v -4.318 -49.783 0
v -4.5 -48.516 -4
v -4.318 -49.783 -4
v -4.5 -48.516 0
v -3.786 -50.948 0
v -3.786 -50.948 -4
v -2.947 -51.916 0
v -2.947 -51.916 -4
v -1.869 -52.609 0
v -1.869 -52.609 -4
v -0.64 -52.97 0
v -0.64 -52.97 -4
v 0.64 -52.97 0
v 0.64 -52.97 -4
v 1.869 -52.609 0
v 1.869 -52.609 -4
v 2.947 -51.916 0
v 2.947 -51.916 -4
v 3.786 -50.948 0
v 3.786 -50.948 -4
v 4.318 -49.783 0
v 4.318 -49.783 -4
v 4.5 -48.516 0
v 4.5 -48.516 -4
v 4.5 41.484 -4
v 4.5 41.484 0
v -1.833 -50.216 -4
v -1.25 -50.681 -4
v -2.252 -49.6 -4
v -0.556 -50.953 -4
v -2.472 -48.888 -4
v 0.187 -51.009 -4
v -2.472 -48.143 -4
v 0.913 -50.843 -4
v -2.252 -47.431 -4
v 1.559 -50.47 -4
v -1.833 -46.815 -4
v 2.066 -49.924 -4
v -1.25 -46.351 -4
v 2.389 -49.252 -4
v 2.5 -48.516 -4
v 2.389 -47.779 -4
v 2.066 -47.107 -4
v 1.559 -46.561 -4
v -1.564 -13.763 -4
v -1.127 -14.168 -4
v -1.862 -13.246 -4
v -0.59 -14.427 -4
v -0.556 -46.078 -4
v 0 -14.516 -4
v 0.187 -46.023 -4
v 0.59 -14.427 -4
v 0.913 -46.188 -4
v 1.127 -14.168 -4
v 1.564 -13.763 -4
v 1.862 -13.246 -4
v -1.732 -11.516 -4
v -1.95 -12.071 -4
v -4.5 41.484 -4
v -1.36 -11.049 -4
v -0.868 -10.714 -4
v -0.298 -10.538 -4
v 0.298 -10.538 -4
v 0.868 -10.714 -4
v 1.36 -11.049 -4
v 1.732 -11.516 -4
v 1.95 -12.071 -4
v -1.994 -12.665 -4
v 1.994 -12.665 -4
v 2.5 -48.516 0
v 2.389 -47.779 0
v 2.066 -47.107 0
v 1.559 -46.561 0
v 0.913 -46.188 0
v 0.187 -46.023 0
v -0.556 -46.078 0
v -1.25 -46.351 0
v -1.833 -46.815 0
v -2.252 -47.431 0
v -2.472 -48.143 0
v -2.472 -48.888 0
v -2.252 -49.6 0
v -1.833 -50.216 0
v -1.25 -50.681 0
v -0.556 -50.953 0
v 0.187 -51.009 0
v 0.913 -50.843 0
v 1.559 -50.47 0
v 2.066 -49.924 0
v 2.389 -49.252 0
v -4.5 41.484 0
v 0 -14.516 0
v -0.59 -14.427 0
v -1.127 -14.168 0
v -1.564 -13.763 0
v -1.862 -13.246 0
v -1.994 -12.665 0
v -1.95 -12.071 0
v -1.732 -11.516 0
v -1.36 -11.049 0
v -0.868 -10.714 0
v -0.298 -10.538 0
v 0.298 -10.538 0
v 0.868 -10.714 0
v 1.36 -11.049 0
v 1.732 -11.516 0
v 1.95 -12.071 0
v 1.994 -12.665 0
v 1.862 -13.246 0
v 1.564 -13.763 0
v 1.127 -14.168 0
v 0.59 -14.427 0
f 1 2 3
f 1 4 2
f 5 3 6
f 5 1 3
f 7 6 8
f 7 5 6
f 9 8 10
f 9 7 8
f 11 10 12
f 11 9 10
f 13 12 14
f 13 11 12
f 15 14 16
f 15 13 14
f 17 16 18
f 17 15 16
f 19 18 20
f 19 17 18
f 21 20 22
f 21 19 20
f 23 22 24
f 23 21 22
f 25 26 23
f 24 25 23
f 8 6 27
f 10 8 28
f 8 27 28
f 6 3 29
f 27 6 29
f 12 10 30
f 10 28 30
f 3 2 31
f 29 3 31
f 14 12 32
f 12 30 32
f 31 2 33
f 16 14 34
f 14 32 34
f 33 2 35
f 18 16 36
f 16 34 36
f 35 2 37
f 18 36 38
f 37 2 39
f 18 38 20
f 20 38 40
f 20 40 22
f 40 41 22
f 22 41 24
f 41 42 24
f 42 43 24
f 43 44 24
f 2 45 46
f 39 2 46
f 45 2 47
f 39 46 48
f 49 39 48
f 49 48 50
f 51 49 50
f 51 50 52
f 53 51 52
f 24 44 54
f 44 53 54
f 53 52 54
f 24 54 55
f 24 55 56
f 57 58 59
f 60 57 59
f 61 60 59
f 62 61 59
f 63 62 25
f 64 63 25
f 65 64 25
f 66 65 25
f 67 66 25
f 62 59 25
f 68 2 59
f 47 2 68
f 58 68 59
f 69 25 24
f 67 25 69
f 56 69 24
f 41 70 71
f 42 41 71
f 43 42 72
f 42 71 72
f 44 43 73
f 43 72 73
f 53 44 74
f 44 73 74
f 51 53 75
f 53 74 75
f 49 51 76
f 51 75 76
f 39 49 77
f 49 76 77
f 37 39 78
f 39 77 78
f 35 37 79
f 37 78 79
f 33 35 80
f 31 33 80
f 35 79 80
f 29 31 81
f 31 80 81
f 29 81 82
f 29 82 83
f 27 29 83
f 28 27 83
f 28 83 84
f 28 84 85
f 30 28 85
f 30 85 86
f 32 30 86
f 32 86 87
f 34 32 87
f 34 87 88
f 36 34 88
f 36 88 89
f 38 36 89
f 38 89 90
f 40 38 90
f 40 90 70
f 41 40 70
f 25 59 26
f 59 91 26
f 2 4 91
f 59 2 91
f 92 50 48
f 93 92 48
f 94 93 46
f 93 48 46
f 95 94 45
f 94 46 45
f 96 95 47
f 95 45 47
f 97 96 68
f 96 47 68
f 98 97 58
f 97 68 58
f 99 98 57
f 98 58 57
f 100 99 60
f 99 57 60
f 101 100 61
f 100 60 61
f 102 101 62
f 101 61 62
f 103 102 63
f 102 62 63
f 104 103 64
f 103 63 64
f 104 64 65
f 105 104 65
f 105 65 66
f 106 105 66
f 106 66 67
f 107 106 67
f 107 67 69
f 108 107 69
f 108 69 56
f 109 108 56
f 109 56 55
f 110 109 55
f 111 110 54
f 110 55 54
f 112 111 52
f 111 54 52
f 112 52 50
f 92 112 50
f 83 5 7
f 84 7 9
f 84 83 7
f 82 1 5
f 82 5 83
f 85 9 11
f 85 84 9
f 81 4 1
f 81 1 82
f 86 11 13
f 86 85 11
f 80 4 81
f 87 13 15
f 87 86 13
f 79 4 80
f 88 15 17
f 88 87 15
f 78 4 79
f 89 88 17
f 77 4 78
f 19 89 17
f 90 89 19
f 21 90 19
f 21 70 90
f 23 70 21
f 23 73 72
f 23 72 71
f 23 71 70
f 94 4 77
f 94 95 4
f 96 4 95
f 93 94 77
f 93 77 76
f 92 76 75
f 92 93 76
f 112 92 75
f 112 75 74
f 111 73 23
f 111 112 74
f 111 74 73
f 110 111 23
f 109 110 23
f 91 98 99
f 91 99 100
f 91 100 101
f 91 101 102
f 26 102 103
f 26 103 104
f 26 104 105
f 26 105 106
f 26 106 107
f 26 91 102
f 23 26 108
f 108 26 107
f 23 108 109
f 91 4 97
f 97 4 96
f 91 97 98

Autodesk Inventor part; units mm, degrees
ref_plane "YZ Plane" through (0, 0, 0) normal (1, 0, 0) x (0, 1, 0)
ref_plane "XZ Plane" through (0, 0, 0) normal (0, 1, 0) x (-1, 0, 0)
ref_plane "XY Plane" through (0, 0, 0) normal (0, 0, 1) x (1, 0, 0)
sketch "Boceto1" plane through (0, 0, 0) normal (0, 0, 1) x (1, 0, 0)
  line L0 (0, 55.8594) -> (0, -55.8594) construction
  line L1 (110.1563, 0) -> (-110.1563, 0) construction
  line L2 (-4.5, 41.4844) -> (4.5, 41.4844)
  line L3 (4.5, 41.4844) -> (4.5, -48.5156)
  line L4 (4.5, -48.5156) -> (-4.5, -48.5156)
  line L5 (-4.5, -48.5156) -> (-4.5, 41.4844)
  arc A0 (-4.5, -48.5156) -> (4.5, -48.5156) centre (0, -48.5156) ccw
  circle A1 centre (0, -48.5156) radius 2.5
  point P0 (0, 0)
  point P1 (0, 0)
  point P2 (0, 41.4844)
  point P3 (0, -12.5156)
  point P4 (0, -48.5156)
  dimension "d0" = 90
  dimension "d1" = 9
  dimension "d2" = 4.5
  dimension "d3" = 5
  dimension "d4" = 36
  dimension "d5" = 41.4844
  dimension "d6" = 105.6563
  dimension "d7" = 55.8594
extrude "Extrusión1" add sketch "Boceto1" against normal blind 4 contours L2 L3 L4 A1 L5 | L4 A1 A0
hole "Agujero1" at (0, -12.5156, 0) direction (0, 0, -1) diameter 4 end through all
properties part number "1-HUDSON-8-33-TDR HAND PUMP HANDLE"
